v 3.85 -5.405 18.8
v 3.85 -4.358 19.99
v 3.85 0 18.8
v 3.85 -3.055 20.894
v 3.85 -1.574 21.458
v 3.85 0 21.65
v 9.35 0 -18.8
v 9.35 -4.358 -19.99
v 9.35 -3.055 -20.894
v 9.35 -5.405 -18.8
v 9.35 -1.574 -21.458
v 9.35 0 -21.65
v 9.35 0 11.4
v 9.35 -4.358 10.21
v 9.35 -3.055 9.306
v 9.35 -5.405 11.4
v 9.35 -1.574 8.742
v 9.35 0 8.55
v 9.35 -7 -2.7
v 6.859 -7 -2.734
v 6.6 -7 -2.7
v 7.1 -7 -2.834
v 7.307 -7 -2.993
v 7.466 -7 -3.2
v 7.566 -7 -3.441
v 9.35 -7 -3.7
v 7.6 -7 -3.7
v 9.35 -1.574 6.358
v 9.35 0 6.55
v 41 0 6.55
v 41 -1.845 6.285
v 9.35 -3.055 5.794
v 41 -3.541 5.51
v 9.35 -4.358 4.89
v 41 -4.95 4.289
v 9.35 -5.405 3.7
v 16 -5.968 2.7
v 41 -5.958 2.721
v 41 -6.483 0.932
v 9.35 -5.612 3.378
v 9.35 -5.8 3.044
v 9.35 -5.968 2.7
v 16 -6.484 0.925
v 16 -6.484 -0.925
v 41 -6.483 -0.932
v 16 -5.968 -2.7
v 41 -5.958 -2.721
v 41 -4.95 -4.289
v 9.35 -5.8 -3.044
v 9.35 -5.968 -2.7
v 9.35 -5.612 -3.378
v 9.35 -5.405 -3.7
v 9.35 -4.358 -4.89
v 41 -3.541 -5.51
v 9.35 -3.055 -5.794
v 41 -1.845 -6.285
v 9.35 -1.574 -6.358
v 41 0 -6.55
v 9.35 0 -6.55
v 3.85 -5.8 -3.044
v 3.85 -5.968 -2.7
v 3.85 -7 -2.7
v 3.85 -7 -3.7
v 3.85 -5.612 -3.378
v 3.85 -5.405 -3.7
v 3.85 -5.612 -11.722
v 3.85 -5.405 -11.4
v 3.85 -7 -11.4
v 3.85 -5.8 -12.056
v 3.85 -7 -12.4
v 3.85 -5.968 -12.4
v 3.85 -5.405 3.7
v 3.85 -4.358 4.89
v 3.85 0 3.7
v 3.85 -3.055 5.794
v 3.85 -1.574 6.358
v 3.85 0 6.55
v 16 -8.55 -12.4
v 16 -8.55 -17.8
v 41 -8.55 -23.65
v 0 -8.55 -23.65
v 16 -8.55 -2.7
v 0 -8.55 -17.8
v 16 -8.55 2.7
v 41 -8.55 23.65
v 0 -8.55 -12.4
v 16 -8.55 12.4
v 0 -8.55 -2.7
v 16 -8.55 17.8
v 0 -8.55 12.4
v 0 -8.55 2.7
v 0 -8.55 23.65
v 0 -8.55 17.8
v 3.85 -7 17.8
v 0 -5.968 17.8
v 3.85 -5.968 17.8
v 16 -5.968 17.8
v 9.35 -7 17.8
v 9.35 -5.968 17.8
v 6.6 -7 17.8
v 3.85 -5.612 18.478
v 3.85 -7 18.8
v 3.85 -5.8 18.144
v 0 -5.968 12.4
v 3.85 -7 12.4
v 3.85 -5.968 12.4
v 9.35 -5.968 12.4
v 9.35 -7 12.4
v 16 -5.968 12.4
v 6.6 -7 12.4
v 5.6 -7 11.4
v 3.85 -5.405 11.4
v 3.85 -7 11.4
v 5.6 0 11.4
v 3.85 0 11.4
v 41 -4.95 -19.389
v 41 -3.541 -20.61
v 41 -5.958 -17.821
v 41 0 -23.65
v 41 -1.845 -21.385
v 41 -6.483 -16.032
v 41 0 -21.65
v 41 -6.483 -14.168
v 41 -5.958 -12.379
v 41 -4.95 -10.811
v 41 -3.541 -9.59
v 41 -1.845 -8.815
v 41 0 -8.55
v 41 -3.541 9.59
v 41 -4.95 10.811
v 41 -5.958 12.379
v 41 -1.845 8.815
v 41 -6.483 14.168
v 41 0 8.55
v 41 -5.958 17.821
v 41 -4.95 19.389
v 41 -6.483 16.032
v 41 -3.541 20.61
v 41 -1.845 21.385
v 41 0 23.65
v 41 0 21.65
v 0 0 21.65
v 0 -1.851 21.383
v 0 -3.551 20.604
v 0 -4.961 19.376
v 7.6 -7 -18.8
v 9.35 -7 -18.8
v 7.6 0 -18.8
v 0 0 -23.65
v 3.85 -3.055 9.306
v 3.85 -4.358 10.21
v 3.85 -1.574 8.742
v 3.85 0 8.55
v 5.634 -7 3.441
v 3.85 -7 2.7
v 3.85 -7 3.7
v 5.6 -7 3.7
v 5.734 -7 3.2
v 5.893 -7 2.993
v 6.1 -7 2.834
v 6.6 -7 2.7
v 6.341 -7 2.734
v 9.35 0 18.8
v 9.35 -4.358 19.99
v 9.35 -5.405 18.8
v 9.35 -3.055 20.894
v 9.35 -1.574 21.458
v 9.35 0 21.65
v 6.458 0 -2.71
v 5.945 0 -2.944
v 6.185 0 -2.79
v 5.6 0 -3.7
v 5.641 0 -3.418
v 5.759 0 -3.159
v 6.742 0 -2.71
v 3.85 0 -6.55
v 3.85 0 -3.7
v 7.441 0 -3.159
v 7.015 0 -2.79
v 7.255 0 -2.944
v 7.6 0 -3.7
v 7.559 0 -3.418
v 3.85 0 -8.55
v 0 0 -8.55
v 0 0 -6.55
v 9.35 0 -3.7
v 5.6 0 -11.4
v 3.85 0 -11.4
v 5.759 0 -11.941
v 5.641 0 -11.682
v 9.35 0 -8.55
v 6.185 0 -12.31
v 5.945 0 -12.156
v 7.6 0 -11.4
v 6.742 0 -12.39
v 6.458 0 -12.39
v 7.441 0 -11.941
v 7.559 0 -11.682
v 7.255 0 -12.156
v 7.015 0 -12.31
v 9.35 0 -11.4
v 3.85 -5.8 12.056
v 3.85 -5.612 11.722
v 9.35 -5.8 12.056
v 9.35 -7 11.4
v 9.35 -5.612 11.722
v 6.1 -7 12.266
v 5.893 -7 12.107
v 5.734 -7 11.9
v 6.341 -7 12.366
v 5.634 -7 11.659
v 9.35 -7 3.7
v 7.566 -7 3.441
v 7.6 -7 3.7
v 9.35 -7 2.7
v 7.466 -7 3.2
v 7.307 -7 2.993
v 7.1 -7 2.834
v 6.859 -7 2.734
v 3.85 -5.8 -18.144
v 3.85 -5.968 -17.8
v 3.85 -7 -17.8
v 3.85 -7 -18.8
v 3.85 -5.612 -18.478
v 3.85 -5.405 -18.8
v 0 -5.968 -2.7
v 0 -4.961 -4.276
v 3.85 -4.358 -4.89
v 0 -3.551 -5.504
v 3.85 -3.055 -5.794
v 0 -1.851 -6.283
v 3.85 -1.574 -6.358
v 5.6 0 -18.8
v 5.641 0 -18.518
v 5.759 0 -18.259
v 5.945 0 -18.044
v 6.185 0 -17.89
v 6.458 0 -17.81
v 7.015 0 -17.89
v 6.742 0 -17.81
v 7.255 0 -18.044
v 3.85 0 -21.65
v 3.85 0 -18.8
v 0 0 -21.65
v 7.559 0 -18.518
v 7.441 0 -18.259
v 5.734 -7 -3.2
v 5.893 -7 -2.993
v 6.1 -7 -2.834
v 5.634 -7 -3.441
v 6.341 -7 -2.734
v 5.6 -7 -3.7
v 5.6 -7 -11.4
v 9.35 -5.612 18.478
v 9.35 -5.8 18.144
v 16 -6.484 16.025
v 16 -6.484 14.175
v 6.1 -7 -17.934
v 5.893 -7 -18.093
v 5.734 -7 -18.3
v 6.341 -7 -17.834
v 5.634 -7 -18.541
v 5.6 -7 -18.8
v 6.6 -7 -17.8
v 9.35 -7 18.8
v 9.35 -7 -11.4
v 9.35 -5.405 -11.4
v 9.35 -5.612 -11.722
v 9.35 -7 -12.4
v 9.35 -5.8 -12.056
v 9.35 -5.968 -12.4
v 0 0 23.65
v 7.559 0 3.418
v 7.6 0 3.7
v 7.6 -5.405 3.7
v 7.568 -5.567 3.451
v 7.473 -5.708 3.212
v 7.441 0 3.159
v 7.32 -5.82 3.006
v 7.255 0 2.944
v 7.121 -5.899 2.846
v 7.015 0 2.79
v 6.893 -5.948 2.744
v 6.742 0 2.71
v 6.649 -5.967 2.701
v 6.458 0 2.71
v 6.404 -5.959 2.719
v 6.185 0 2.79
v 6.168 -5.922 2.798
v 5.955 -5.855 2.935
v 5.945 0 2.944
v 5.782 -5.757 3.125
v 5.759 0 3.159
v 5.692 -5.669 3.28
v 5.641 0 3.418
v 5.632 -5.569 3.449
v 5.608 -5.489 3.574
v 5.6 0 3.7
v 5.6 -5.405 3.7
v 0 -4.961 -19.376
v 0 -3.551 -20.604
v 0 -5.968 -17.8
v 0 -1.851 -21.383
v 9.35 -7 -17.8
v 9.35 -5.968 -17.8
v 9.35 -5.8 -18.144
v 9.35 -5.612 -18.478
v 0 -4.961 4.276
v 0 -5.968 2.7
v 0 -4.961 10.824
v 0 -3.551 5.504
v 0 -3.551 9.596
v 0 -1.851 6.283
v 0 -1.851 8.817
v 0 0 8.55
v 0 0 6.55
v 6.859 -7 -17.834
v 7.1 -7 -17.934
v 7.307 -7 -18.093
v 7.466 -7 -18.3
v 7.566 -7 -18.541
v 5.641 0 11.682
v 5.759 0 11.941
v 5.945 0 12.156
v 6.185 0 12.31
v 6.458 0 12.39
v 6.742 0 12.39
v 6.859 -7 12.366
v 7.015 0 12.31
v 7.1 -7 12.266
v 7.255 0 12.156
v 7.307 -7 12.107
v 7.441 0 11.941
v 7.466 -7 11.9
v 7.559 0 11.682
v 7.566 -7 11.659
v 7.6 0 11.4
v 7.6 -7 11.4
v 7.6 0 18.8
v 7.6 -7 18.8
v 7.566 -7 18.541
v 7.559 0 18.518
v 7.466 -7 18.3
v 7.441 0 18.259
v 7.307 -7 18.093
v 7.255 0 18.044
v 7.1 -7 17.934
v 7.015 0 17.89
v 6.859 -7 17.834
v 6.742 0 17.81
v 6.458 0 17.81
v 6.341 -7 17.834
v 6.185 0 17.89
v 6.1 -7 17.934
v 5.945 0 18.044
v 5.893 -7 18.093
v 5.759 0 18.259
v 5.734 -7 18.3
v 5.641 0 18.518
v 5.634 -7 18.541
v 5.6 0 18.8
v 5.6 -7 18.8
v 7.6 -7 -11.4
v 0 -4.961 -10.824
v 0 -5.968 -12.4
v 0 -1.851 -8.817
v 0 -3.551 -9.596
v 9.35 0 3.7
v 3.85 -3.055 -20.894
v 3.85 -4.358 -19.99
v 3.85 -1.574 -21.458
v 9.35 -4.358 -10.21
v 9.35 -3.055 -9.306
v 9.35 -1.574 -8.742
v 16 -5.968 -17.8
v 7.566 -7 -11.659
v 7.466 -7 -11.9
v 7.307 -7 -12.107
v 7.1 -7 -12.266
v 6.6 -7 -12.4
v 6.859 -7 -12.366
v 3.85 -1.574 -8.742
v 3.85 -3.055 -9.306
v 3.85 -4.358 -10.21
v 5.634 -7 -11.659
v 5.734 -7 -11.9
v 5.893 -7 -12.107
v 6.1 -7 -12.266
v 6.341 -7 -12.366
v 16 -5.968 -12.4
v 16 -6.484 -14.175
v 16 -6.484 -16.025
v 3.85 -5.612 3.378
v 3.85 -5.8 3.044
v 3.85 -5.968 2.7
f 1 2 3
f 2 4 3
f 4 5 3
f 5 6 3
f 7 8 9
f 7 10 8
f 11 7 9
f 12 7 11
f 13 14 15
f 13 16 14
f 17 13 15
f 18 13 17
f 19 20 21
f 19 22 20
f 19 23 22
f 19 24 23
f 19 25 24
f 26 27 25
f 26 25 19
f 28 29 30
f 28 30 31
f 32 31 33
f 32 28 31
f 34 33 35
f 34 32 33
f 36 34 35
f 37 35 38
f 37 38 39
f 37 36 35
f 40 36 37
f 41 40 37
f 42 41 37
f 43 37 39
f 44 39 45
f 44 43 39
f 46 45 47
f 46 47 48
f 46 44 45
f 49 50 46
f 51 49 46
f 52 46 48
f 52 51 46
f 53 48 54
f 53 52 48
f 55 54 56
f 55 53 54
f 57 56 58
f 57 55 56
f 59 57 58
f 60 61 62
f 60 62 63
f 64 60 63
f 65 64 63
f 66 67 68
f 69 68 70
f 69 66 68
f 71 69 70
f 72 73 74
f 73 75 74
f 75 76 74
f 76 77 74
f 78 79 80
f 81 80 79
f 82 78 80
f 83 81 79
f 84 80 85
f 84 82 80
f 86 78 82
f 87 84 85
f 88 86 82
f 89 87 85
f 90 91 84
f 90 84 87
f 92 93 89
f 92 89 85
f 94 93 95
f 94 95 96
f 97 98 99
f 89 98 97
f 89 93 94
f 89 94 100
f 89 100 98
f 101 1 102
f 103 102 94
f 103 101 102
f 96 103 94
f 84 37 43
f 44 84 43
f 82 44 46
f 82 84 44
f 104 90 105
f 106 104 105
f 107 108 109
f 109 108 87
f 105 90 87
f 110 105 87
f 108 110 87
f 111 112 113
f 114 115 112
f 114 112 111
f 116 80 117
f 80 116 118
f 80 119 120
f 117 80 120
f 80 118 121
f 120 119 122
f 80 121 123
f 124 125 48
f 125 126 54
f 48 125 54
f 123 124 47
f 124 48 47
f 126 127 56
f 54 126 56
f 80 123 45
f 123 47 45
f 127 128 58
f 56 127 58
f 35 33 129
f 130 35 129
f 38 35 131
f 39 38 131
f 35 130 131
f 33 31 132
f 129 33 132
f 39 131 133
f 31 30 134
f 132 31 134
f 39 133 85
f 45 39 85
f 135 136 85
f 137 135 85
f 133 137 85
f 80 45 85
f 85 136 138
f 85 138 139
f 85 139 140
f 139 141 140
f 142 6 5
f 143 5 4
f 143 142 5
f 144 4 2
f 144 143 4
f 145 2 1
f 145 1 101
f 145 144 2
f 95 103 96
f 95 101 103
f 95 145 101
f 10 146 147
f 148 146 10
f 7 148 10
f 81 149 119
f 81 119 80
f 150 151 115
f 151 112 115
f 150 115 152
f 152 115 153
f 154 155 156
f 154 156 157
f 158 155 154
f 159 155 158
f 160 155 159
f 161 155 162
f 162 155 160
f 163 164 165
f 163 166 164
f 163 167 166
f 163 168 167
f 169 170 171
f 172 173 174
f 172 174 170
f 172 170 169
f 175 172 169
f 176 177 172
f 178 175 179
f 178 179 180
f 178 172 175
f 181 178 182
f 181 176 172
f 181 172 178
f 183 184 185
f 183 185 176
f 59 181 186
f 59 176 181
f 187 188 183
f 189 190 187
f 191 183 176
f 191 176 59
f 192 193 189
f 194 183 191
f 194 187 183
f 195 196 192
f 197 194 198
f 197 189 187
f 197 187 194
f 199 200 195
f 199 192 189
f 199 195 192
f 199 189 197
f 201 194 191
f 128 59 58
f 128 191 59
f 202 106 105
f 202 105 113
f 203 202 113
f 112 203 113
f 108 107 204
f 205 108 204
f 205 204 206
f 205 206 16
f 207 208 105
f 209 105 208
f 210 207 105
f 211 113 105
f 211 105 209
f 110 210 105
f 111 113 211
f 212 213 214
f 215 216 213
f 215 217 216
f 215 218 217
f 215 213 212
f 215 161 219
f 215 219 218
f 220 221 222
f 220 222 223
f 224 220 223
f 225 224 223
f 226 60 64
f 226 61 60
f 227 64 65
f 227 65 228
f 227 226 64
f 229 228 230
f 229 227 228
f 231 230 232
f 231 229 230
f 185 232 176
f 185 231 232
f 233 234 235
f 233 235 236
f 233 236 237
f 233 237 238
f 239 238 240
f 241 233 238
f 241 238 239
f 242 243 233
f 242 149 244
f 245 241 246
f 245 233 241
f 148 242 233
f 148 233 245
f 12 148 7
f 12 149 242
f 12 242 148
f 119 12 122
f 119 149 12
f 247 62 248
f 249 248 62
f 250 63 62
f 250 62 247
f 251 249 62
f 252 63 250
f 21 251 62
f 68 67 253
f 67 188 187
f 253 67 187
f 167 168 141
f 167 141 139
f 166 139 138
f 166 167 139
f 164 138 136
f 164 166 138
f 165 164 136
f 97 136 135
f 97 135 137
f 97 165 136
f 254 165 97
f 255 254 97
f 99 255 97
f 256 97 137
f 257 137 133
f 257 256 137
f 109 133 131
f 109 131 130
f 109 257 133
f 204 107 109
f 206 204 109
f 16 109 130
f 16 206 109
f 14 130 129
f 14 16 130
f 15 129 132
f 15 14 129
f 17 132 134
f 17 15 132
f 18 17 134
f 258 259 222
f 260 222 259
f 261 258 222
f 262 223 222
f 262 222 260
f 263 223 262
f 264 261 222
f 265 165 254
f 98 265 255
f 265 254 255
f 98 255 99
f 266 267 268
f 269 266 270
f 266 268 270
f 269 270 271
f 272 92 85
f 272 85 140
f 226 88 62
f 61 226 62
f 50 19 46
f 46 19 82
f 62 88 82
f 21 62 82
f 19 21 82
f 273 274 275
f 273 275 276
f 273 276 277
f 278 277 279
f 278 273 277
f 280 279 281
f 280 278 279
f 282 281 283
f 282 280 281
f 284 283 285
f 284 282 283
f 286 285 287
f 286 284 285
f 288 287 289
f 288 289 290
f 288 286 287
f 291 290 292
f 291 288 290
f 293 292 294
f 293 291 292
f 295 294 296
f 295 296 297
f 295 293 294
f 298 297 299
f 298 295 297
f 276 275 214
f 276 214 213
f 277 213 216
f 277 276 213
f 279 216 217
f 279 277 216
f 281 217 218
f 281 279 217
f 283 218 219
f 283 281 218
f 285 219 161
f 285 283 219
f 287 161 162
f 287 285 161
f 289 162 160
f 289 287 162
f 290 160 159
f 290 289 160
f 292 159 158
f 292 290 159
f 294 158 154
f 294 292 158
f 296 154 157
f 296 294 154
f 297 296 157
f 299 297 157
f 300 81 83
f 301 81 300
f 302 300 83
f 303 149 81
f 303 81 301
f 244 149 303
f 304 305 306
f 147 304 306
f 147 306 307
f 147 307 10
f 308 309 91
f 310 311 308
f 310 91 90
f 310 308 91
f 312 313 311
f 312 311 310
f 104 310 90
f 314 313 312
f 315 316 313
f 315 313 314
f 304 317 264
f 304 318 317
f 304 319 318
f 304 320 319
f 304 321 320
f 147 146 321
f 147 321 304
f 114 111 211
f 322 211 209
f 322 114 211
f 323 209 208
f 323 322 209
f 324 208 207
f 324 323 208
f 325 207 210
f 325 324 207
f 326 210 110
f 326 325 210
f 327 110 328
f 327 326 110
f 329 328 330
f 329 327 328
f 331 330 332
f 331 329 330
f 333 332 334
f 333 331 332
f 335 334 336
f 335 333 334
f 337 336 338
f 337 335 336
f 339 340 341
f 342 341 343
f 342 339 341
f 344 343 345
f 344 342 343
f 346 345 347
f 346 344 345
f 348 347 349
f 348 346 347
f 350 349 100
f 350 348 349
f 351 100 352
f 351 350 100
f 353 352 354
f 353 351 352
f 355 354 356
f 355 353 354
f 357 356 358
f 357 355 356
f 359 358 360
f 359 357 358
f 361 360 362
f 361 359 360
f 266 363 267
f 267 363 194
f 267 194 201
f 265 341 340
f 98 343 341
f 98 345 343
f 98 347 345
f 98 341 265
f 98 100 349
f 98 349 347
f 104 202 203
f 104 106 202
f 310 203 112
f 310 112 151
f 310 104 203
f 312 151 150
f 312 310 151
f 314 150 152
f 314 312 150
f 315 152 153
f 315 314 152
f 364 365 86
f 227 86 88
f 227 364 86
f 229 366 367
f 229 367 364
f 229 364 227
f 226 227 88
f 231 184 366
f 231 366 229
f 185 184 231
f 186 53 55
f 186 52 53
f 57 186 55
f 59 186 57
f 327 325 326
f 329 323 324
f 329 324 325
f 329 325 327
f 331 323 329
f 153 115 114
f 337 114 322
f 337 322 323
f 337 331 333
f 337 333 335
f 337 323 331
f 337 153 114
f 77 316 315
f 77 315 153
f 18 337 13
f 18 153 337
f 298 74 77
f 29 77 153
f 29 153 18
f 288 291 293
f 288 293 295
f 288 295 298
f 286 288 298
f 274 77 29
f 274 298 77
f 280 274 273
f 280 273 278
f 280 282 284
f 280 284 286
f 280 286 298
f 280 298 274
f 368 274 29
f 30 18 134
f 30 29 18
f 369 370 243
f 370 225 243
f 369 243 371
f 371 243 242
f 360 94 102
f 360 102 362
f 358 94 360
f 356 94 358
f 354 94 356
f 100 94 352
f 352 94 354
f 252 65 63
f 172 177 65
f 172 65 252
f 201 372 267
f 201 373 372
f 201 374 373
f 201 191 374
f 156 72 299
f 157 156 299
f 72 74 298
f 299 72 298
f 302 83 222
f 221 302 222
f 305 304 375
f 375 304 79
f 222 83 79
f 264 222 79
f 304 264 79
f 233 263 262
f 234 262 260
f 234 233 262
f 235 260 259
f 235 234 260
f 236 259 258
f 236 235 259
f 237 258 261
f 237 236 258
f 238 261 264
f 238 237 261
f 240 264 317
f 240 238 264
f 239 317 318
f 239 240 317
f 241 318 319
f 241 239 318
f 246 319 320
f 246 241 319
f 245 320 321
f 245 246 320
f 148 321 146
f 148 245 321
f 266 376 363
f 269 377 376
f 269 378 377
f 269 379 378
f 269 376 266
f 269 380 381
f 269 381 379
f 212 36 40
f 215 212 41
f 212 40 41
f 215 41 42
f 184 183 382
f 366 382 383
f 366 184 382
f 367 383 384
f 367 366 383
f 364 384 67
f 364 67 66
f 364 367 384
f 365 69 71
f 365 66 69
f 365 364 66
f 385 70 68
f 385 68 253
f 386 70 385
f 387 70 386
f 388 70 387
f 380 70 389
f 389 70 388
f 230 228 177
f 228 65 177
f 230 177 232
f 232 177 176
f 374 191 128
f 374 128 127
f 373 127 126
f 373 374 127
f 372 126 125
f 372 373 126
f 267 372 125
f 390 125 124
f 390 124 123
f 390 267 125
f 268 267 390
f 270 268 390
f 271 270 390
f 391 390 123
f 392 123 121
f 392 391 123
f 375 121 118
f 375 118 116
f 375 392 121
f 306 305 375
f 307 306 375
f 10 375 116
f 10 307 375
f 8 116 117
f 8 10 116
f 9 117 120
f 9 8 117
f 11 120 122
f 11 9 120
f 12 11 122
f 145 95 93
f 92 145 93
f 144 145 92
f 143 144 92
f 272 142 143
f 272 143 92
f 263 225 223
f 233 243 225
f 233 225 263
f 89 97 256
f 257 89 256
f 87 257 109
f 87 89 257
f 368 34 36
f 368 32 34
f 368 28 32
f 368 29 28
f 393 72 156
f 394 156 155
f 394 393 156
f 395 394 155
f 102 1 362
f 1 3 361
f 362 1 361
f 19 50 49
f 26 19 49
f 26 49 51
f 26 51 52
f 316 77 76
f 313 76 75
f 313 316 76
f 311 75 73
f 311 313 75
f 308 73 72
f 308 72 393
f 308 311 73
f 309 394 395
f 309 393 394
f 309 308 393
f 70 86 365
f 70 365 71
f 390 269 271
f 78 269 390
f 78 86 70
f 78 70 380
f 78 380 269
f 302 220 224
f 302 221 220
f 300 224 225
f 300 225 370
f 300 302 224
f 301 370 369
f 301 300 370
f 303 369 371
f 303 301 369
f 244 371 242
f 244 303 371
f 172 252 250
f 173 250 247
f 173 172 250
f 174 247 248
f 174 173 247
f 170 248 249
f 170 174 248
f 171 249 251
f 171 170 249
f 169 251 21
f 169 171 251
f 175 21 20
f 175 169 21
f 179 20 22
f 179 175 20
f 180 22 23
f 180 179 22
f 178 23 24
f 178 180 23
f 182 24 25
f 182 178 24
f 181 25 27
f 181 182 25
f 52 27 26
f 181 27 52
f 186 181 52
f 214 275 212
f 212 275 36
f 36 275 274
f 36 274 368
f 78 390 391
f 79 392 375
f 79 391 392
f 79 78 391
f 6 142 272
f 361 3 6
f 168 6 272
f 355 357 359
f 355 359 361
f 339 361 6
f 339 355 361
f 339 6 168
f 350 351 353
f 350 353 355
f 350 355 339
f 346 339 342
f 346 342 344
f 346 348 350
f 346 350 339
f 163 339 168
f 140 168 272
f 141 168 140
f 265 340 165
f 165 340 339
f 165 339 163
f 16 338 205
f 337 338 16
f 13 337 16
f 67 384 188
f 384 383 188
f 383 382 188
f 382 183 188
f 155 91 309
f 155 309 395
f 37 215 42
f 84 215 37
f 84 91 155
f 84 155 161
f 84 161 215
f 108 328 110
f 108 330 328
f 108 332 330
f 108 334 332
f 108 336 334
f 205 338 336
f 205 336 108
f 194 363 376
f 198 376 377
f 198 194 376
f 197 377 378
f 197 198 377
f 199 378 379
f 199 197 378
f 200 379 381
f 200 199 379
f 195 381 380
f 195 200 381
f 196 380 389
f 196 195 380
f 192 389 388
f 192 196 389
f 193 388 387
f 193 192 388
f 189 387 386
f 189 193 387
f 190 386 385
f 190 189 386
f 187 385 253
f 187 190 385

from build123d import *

# Parameters (mm, degrees)
BOSS_EXTRUDE1_DEPTH     = 41
BOSS_EXTRUDE2_REACH     = 50.098
SKETCH2_R               = 1
SKETCH4_W               = 5.5
SKETCH4_H               = 13.1
SKETCH4_R               = 1
CUT_EXTRUDE1_DEPTH      = 7
BOSS_EXTRUDE4_REACH     = 50.098
SKETCH6_W               = 5.5
SKETCH6_H               = 2.85
CUT_EXTRUDE2_DEPTH      = 48.846865116
CUT_EXTRUDE2_DEPTH_BACK = 48.846865116
SKETCH7_W               = 16
SKETCH7_H               = 5.4


with BuildPart() as part:
    # Sketch1 → Boss-Extrude1 (new body)
    with BuildSketch(Plane(origin=(0, 0, 0), x_dir=(0, 0, -1), z_dir=(1, 0, 0))):
        with BuildLine():
            Line((-8.55, 0), (-6.55, 0))
            ThreePointArc((-6.55, 0), (0, -6.55), (6.55, 0))
            Line((6.55, 0), (8.55, 0))
            ThreePointArc((8.55, 0), (15.1, -6.55), (21.65, 0))
            Line((21.65, 0), (23.65, 0))
            Line((23.65, 0), (23.65, -8.55))
            Line((23.65, -8.55), (-23.65, -8.55))
            Line((-23.65, -8.55), (-23.65, 0))
            Line((-23.65, 0), (-21.65, 0))
            ThreePointArc((-21.65, 0), (-15.1, -6.55), (-8.55, 0))
        make_face()
    extrude(amount=BOSS_EXTRUDE1_DEPTH)

    # Sketch2 → Boss-Extrude2 (add, up to next)
    with BuildSketch(Plane(origin=(0, 0, 0), x_dir=(1, 0, 0), z_dir=(0, 1, 0)), mode=Mode.PRIVATE) as boss_extrude2_sk1:
        with Locations(Location((6.6, 3.7, 0), (0, 0, 270))):
            Circle(SKETCH2_R)
    boss_extrude2_tool1 = extrude(boss_extrude2_sk1.sketch, amount=-BOSS_EXTRUDE2_REACH, mode=Mode.PRIVATE) - part.part
    # Sketch2 → Boss-Extrude2 (add, up to next)
    with BuildSketch(Plane(origin=(0, 0, 0), x_dir=(1, 0, 0), z_dir=(0, 1, 0)), mode=Mode.PRIVATE) as boss_extrude2_sk2:
        with Locations(Location((6.6, -3.7, 0), (0, 0, 270))):
            Circle(SKETCH2_R)
    boss_extrude2_tool2 = extrude(boss_extrude2_sk2.sketch, amount=-BOSS_EXTRUDE2_REACH, mode=Mode.PRIVATE) - part.part
    # Sketch2 → Boss-Extrude2 (add, up to next)
    with BuildSketch(Plane(origin=(0, 0, 0), x_dir=(1, 0, 0), z_dir=(0, 1, 0)), mode=Mode.PRIVATE) as boss_extrude2_sk3:
        with Locations(Location((6.6, -11.4, 0), (0, 0, 270))):
            Circle(SKETCH2_R)
    boss_extrude2_tool3 = extrude(boss_extrude2_sk3.sketch, amount=-BOSS_EXTRUDE2_REACH, mode=Mode.PRIVATE) - part.part
    # Sketch2 → Boss-Extrude2 (add, up to next)
    with BuildSketch(Plane(origin=(0, 0, 0), x_dir=(1, 0, 0), z_dir=(0, 1, 0)), mode=Mode.PRIVATE) as boss_extrude2_sk4:
        with Locations(Location((6.6, -18.8, 0), (0, 0, 270))):
            Circle(SKETCH2_R)
    boss_extrude2_tool4 = extrude(boss_extrude2_sk4.sketch, amount=-BOSS_EXTRUDE2_REACH, mode=Mode.PRIVATE) - part.part
    # Sketch2 → Boss-Extrude2 (add, up to next)
    with BuildSketch(Plane(origin=(0, 0, 0), x_dir=(1, 0, 0), z_dir=(0, 1, 0)), mode=Mode.PRIVATE) as boss_extrude2_sk5:
        with Locations(Location((6.6, 18.8, 0), (0, 0, 270))):
            Circle(SKETCH2_R)
    boss_extrude2_tool5 = extrude(boss_extrude2_sk5.sketch, amount=-BOSS_EXTRUDE2_REACH, mode=Mode.PRIVATE) - part.part
    # Sketch2 → Boss-Extrude2 (add, up to next)
    with BuildSketch(Plane(origin=(0, 0, 0), x_dir=(1, 0, 0), z_dir=(0, 1, 0)), mode=Mode.PRIVATE) as boss_extrude2_sk6:
        with Locations(Location((6.6, 11.4, 0), (0, 0, 270))):
            Circle(SKETCH2_R)
    boss_extrude2_tool6 = extrude(boss_extrude2_sk6.sketch, amount=-BOSS_EXTRUDE2_REACH, mode=Mode.PRIVATE) - part.part
    add(boss_extrude2_tool1.solids().sort_by_distance((6.6, 0, -3.7))[0])
    add(boss_extrude2_tool2.solids().sort_by_distance((6.6, 0, 3.7))[0])
    add(boss_extrude2_tool3.solids().sort_by_distance((6.6, 0, 11.4))[0])
    add(boss_extrude2_tool4.solids().sort_by_distance((6.6, 0, 18.8))[0])
    add(boss_extrude2_tool5.solids().sort_by_distance((6.6, 0, -18.8))[0])
    add(boss_extrude2_tool6.solids().sort_by_distance((6.6, 0, -11.4))[0])

    # Sketch4 → Cut-Extrude1 (cut)
    # profile 1 of 3: a face of its own
    with BuildSketch(Plane(origin=(0, 0, 0), x_dir=(1, 0, 0), z_dir=(0, 1, 0))):
        with Locations((6.6, 0)):
            Rectangle(SKETCH4_W, SKETCH4_H)
        with Locations(Location((6.6, 3.7, 0), (0, 0, 270))):
            Circle(SKETCH4_R, mode=Mode.SUBTRACT)
        with Locations(Location((6.6, -3.7, 0), (0, 0, 270))):
            Circle(SKETCH4_R, mode=Mode.SUBTRACT)
    # profile 2 of 3: a face of its own
    with BuildSketch(Plane(origin=(0, 0, 0), x_dir=(1, 0, 0), z_dir=(0, 1, 0))):
        with Locations((6.6, -15.1)):
            Rectangle(SKETCH4_W, SKETCH4_H)
        with Locations(Location((6.6, -11.4, 0), (0, 0, 90))):
            Circle(SKETCH4_R, mode=Mode.SUBTRACT)
        with Locations(Location((6.6, -18.8, 0), (0, 0, 90))):
            Circle(SKETCH4_R, mode=Mode.SUBTRACT)
    # profile 3 of 3: a face of its own
    with BuildSketch(Plane(origin=(0, 0, 0), x_dir=(1, 0, 0), z_dir=(0, 1, 0))):
        with Locations((6.6, 15.1)):
            Rectangle(SKETCH4_W, SKETCH4_H)
        with Locations(Location((6.6, 11.4, 0), (0, 0, 90))):
            Circle(SKETCH4_R, mode=Mode.SUBTRACT)
        with Locations(Location((6.6, 18.8, 0), (0, 0, 90))):
            Circle(SKETCH4_R, mode=Mode.SUBTRACT)
    extrude(amount=-CUT_EXTRUDE1_DEPTH, mode=Mode.SUBTRACT)

    # Boss-Extrude4: up to this face of the body (flat: up to its plane)
    boss_extrude4_end = Plane(part.part.faces().sort_by_distance((6.6, -7, -15.1))[0])
    # Sketch6 → Boss-Extrude4 (add, up to the picked face)
    with BuildSketch(Plane(origin=(0, 0, 0), x_dir=(1, 0, 0), z_dir=(0, 1, 0)), mode=Mode.PRIVATE) as boss_extrude4_sk1:
        with Locations((6.6, -5.125)):
            Rectangle(SKETCH6_W, SKETCH6_H)
    boss_extrude4_tool1 = split(extrude(boss_extrude4_sk1.sketch, amount=-BOSS_EXTRUDE4_REACH, mode=Mode.PRIVATE), bisect_by=boss_extrude4_end, keep=Keep.BOTH, mode=Mode.PRIVATE)
    # Sketch6 → Boss-Extrude4 (add, up to the picked face)
    with BuildSketch(Plane(origin=(0, 0, 0), x_dir=(1, 0, 0), z_dir=(0, 1, 0)), mode=Mode.PRIVATE) as boss_extrude4_sk2:
        with Locations((6.6, 5.125)):
            Rectangle(SKETCH6_W, SKETCH6_H)
    boss_extrude4_tool2 = split(extrude(boss_extrude4_sk2.sketch, amount=-BOSS_EXTRUDE4_REACH, mode=Mode.PRIVATE), bisect_by=boss_extrude4_end, keep=Keep.BOTH, mode=Mode.PRIVATE)
    # Sketch6 → Boss-Extrude4 (add, up to the picked face)
    with BuildSketch(Plane(origin=(0, 0, 0), x_dir=(1, 0, 0), z_dir=(0, 1, 0)), mode=Mode.PRIVATE) as boss_extrude4_sk3:
        with Locations((6.6, -20.225)):
            Rectangle(SKETCH6_W, SKETCH6_H)
    boss_extrude4_tool3 = split(extrude(boss_extrude4_sk3.sketch, amount=-BOSS_EXTRUDE4_REACH, mode=Mode.PRIVATE), bisect_by=boss_extrude4_end, keep=Keep.BOTH, mode=Mode.PRIVATE)
    # Sketch6 → Boss-Extrude4 (add, up to the picked face)
    with BuildSketch(Plane(origin=(0, 0, 0), x_dir=(1, 0, 0), z_dir=(0, 1, 0)), mode=Mode.PRIVATE) as boss_extrude4_sk4:
        with Locations((6.6, -9.975)):
            Rectangle(SKETCH6_W, SKETCH6_H)
    boss_extrude4_tool4 = split(extrude(boss_extrude4_sk4.sketch, amount=-BOSS_EXTRUDE4_REACH, mode=Mode.PRIVATE), bisect_by=boss_extrude4_end, keep=Keep.BOTH, mode=Mode.PRIVATE)
    # Sketch6 → Boss-Extrude4 (add, up to the picked face)
    with BuildSketch(Plane(origin=(0, 0, 0), x_dir=(1, 0, 0), z_dir=(0, 1, 0)), mode=Mode.PRIVATE) as boss_extrude4_sk5:
        with Locations((6.6, 9.975)):
            Rectangle(SKETCH6_W, SKETCH6_H)
    boss_extrude4_tool5 = split(extrude(boss_extrude4_sk5.sketch, amount=-BOSS_EXTRUDE4_REACH, mode=Mode.PRIVATE), bisect_by=boss_extrude4_end, keep=Keep.BOTH, mode=Mode.PRIVATE)
    # Sketch6 → Boss-Extrude4 (add, up to the picked face)
    with BuildSketch(Plane(origin=(0, 0, 0), x_dir=(1, 0, 0), z_dir=(0, 1, 0)), mode=Mode.PRIVATE) as boss_extrude4_sk6:
        with Locations((6.6, 20.225)):
            Rectangle(SKETCH6_W, SKETCH6_H)
    boss_extrude4_tool6 = split(extrude(boss_extrude4_sk6.sketch, amount=-BOSS_EXTRUDE4_REACH, mode=Mode.PRIVATE), bisect_by=boss_extrude4_end, keep=Keep.BOTH, mode=Mode.PRIVATE)
    add(boss_extrude4_tool1.solids().sort_by(Axis((6.6, 0, 5.125), (0, -1, 0)))[0])
    add(boss_extrude4_tool2.solids().sort_by(Axis((6.6, 0, -5.125), (0, -1, 0)))[0])
    add(boss_extrude4_tool3.solids().sort_by(Axis((6.6, 0, 20.225), (0, -1, 0)))[0])
    add(boss_extrude4_tool4.solids().sort_by(Axis((6.6, 0, 9.975), (0, -1, 0)))[0])
    add(boss_extrude4_tool5.solids().sort_by(Axis((6.6, 0, -9.975), (0, -1, 0)))[0])
    add(boss_extrude4_tool6.solids().sort_by(Axis((6.6, 0, -20.225), (0, -1, 0)))[0])

    # Sketch7 → Cut-Extrude2 (cut, two sides: drawn at the far end of the back side and taken through both)
    with BuildSketch(Plane(origin=(0, -7, 0), x_dir=(1, 0, 0), z_dir=(0, 1, 0)).offset(-CUT_EXTRUDE2_DEPTH_BACK)):
        with Locations((8, 0)):
            Rectangle(SKETCH7_W, SKETCH7_H)
        with Locations((8, -15.1)):
            Rectangle(SKETCH7_W, SKETCH7_H)
        with Locations((8, 15.1)):
            Rectangle(SKETCH7_W, SKETCH7_H)
    extrude(amount=CUT_EXTRUDE2_DEPTH + CUT_EXTRUDE2_DEPTH_BACK, mode=Mode.SUBTRACT)


solid = part.part
